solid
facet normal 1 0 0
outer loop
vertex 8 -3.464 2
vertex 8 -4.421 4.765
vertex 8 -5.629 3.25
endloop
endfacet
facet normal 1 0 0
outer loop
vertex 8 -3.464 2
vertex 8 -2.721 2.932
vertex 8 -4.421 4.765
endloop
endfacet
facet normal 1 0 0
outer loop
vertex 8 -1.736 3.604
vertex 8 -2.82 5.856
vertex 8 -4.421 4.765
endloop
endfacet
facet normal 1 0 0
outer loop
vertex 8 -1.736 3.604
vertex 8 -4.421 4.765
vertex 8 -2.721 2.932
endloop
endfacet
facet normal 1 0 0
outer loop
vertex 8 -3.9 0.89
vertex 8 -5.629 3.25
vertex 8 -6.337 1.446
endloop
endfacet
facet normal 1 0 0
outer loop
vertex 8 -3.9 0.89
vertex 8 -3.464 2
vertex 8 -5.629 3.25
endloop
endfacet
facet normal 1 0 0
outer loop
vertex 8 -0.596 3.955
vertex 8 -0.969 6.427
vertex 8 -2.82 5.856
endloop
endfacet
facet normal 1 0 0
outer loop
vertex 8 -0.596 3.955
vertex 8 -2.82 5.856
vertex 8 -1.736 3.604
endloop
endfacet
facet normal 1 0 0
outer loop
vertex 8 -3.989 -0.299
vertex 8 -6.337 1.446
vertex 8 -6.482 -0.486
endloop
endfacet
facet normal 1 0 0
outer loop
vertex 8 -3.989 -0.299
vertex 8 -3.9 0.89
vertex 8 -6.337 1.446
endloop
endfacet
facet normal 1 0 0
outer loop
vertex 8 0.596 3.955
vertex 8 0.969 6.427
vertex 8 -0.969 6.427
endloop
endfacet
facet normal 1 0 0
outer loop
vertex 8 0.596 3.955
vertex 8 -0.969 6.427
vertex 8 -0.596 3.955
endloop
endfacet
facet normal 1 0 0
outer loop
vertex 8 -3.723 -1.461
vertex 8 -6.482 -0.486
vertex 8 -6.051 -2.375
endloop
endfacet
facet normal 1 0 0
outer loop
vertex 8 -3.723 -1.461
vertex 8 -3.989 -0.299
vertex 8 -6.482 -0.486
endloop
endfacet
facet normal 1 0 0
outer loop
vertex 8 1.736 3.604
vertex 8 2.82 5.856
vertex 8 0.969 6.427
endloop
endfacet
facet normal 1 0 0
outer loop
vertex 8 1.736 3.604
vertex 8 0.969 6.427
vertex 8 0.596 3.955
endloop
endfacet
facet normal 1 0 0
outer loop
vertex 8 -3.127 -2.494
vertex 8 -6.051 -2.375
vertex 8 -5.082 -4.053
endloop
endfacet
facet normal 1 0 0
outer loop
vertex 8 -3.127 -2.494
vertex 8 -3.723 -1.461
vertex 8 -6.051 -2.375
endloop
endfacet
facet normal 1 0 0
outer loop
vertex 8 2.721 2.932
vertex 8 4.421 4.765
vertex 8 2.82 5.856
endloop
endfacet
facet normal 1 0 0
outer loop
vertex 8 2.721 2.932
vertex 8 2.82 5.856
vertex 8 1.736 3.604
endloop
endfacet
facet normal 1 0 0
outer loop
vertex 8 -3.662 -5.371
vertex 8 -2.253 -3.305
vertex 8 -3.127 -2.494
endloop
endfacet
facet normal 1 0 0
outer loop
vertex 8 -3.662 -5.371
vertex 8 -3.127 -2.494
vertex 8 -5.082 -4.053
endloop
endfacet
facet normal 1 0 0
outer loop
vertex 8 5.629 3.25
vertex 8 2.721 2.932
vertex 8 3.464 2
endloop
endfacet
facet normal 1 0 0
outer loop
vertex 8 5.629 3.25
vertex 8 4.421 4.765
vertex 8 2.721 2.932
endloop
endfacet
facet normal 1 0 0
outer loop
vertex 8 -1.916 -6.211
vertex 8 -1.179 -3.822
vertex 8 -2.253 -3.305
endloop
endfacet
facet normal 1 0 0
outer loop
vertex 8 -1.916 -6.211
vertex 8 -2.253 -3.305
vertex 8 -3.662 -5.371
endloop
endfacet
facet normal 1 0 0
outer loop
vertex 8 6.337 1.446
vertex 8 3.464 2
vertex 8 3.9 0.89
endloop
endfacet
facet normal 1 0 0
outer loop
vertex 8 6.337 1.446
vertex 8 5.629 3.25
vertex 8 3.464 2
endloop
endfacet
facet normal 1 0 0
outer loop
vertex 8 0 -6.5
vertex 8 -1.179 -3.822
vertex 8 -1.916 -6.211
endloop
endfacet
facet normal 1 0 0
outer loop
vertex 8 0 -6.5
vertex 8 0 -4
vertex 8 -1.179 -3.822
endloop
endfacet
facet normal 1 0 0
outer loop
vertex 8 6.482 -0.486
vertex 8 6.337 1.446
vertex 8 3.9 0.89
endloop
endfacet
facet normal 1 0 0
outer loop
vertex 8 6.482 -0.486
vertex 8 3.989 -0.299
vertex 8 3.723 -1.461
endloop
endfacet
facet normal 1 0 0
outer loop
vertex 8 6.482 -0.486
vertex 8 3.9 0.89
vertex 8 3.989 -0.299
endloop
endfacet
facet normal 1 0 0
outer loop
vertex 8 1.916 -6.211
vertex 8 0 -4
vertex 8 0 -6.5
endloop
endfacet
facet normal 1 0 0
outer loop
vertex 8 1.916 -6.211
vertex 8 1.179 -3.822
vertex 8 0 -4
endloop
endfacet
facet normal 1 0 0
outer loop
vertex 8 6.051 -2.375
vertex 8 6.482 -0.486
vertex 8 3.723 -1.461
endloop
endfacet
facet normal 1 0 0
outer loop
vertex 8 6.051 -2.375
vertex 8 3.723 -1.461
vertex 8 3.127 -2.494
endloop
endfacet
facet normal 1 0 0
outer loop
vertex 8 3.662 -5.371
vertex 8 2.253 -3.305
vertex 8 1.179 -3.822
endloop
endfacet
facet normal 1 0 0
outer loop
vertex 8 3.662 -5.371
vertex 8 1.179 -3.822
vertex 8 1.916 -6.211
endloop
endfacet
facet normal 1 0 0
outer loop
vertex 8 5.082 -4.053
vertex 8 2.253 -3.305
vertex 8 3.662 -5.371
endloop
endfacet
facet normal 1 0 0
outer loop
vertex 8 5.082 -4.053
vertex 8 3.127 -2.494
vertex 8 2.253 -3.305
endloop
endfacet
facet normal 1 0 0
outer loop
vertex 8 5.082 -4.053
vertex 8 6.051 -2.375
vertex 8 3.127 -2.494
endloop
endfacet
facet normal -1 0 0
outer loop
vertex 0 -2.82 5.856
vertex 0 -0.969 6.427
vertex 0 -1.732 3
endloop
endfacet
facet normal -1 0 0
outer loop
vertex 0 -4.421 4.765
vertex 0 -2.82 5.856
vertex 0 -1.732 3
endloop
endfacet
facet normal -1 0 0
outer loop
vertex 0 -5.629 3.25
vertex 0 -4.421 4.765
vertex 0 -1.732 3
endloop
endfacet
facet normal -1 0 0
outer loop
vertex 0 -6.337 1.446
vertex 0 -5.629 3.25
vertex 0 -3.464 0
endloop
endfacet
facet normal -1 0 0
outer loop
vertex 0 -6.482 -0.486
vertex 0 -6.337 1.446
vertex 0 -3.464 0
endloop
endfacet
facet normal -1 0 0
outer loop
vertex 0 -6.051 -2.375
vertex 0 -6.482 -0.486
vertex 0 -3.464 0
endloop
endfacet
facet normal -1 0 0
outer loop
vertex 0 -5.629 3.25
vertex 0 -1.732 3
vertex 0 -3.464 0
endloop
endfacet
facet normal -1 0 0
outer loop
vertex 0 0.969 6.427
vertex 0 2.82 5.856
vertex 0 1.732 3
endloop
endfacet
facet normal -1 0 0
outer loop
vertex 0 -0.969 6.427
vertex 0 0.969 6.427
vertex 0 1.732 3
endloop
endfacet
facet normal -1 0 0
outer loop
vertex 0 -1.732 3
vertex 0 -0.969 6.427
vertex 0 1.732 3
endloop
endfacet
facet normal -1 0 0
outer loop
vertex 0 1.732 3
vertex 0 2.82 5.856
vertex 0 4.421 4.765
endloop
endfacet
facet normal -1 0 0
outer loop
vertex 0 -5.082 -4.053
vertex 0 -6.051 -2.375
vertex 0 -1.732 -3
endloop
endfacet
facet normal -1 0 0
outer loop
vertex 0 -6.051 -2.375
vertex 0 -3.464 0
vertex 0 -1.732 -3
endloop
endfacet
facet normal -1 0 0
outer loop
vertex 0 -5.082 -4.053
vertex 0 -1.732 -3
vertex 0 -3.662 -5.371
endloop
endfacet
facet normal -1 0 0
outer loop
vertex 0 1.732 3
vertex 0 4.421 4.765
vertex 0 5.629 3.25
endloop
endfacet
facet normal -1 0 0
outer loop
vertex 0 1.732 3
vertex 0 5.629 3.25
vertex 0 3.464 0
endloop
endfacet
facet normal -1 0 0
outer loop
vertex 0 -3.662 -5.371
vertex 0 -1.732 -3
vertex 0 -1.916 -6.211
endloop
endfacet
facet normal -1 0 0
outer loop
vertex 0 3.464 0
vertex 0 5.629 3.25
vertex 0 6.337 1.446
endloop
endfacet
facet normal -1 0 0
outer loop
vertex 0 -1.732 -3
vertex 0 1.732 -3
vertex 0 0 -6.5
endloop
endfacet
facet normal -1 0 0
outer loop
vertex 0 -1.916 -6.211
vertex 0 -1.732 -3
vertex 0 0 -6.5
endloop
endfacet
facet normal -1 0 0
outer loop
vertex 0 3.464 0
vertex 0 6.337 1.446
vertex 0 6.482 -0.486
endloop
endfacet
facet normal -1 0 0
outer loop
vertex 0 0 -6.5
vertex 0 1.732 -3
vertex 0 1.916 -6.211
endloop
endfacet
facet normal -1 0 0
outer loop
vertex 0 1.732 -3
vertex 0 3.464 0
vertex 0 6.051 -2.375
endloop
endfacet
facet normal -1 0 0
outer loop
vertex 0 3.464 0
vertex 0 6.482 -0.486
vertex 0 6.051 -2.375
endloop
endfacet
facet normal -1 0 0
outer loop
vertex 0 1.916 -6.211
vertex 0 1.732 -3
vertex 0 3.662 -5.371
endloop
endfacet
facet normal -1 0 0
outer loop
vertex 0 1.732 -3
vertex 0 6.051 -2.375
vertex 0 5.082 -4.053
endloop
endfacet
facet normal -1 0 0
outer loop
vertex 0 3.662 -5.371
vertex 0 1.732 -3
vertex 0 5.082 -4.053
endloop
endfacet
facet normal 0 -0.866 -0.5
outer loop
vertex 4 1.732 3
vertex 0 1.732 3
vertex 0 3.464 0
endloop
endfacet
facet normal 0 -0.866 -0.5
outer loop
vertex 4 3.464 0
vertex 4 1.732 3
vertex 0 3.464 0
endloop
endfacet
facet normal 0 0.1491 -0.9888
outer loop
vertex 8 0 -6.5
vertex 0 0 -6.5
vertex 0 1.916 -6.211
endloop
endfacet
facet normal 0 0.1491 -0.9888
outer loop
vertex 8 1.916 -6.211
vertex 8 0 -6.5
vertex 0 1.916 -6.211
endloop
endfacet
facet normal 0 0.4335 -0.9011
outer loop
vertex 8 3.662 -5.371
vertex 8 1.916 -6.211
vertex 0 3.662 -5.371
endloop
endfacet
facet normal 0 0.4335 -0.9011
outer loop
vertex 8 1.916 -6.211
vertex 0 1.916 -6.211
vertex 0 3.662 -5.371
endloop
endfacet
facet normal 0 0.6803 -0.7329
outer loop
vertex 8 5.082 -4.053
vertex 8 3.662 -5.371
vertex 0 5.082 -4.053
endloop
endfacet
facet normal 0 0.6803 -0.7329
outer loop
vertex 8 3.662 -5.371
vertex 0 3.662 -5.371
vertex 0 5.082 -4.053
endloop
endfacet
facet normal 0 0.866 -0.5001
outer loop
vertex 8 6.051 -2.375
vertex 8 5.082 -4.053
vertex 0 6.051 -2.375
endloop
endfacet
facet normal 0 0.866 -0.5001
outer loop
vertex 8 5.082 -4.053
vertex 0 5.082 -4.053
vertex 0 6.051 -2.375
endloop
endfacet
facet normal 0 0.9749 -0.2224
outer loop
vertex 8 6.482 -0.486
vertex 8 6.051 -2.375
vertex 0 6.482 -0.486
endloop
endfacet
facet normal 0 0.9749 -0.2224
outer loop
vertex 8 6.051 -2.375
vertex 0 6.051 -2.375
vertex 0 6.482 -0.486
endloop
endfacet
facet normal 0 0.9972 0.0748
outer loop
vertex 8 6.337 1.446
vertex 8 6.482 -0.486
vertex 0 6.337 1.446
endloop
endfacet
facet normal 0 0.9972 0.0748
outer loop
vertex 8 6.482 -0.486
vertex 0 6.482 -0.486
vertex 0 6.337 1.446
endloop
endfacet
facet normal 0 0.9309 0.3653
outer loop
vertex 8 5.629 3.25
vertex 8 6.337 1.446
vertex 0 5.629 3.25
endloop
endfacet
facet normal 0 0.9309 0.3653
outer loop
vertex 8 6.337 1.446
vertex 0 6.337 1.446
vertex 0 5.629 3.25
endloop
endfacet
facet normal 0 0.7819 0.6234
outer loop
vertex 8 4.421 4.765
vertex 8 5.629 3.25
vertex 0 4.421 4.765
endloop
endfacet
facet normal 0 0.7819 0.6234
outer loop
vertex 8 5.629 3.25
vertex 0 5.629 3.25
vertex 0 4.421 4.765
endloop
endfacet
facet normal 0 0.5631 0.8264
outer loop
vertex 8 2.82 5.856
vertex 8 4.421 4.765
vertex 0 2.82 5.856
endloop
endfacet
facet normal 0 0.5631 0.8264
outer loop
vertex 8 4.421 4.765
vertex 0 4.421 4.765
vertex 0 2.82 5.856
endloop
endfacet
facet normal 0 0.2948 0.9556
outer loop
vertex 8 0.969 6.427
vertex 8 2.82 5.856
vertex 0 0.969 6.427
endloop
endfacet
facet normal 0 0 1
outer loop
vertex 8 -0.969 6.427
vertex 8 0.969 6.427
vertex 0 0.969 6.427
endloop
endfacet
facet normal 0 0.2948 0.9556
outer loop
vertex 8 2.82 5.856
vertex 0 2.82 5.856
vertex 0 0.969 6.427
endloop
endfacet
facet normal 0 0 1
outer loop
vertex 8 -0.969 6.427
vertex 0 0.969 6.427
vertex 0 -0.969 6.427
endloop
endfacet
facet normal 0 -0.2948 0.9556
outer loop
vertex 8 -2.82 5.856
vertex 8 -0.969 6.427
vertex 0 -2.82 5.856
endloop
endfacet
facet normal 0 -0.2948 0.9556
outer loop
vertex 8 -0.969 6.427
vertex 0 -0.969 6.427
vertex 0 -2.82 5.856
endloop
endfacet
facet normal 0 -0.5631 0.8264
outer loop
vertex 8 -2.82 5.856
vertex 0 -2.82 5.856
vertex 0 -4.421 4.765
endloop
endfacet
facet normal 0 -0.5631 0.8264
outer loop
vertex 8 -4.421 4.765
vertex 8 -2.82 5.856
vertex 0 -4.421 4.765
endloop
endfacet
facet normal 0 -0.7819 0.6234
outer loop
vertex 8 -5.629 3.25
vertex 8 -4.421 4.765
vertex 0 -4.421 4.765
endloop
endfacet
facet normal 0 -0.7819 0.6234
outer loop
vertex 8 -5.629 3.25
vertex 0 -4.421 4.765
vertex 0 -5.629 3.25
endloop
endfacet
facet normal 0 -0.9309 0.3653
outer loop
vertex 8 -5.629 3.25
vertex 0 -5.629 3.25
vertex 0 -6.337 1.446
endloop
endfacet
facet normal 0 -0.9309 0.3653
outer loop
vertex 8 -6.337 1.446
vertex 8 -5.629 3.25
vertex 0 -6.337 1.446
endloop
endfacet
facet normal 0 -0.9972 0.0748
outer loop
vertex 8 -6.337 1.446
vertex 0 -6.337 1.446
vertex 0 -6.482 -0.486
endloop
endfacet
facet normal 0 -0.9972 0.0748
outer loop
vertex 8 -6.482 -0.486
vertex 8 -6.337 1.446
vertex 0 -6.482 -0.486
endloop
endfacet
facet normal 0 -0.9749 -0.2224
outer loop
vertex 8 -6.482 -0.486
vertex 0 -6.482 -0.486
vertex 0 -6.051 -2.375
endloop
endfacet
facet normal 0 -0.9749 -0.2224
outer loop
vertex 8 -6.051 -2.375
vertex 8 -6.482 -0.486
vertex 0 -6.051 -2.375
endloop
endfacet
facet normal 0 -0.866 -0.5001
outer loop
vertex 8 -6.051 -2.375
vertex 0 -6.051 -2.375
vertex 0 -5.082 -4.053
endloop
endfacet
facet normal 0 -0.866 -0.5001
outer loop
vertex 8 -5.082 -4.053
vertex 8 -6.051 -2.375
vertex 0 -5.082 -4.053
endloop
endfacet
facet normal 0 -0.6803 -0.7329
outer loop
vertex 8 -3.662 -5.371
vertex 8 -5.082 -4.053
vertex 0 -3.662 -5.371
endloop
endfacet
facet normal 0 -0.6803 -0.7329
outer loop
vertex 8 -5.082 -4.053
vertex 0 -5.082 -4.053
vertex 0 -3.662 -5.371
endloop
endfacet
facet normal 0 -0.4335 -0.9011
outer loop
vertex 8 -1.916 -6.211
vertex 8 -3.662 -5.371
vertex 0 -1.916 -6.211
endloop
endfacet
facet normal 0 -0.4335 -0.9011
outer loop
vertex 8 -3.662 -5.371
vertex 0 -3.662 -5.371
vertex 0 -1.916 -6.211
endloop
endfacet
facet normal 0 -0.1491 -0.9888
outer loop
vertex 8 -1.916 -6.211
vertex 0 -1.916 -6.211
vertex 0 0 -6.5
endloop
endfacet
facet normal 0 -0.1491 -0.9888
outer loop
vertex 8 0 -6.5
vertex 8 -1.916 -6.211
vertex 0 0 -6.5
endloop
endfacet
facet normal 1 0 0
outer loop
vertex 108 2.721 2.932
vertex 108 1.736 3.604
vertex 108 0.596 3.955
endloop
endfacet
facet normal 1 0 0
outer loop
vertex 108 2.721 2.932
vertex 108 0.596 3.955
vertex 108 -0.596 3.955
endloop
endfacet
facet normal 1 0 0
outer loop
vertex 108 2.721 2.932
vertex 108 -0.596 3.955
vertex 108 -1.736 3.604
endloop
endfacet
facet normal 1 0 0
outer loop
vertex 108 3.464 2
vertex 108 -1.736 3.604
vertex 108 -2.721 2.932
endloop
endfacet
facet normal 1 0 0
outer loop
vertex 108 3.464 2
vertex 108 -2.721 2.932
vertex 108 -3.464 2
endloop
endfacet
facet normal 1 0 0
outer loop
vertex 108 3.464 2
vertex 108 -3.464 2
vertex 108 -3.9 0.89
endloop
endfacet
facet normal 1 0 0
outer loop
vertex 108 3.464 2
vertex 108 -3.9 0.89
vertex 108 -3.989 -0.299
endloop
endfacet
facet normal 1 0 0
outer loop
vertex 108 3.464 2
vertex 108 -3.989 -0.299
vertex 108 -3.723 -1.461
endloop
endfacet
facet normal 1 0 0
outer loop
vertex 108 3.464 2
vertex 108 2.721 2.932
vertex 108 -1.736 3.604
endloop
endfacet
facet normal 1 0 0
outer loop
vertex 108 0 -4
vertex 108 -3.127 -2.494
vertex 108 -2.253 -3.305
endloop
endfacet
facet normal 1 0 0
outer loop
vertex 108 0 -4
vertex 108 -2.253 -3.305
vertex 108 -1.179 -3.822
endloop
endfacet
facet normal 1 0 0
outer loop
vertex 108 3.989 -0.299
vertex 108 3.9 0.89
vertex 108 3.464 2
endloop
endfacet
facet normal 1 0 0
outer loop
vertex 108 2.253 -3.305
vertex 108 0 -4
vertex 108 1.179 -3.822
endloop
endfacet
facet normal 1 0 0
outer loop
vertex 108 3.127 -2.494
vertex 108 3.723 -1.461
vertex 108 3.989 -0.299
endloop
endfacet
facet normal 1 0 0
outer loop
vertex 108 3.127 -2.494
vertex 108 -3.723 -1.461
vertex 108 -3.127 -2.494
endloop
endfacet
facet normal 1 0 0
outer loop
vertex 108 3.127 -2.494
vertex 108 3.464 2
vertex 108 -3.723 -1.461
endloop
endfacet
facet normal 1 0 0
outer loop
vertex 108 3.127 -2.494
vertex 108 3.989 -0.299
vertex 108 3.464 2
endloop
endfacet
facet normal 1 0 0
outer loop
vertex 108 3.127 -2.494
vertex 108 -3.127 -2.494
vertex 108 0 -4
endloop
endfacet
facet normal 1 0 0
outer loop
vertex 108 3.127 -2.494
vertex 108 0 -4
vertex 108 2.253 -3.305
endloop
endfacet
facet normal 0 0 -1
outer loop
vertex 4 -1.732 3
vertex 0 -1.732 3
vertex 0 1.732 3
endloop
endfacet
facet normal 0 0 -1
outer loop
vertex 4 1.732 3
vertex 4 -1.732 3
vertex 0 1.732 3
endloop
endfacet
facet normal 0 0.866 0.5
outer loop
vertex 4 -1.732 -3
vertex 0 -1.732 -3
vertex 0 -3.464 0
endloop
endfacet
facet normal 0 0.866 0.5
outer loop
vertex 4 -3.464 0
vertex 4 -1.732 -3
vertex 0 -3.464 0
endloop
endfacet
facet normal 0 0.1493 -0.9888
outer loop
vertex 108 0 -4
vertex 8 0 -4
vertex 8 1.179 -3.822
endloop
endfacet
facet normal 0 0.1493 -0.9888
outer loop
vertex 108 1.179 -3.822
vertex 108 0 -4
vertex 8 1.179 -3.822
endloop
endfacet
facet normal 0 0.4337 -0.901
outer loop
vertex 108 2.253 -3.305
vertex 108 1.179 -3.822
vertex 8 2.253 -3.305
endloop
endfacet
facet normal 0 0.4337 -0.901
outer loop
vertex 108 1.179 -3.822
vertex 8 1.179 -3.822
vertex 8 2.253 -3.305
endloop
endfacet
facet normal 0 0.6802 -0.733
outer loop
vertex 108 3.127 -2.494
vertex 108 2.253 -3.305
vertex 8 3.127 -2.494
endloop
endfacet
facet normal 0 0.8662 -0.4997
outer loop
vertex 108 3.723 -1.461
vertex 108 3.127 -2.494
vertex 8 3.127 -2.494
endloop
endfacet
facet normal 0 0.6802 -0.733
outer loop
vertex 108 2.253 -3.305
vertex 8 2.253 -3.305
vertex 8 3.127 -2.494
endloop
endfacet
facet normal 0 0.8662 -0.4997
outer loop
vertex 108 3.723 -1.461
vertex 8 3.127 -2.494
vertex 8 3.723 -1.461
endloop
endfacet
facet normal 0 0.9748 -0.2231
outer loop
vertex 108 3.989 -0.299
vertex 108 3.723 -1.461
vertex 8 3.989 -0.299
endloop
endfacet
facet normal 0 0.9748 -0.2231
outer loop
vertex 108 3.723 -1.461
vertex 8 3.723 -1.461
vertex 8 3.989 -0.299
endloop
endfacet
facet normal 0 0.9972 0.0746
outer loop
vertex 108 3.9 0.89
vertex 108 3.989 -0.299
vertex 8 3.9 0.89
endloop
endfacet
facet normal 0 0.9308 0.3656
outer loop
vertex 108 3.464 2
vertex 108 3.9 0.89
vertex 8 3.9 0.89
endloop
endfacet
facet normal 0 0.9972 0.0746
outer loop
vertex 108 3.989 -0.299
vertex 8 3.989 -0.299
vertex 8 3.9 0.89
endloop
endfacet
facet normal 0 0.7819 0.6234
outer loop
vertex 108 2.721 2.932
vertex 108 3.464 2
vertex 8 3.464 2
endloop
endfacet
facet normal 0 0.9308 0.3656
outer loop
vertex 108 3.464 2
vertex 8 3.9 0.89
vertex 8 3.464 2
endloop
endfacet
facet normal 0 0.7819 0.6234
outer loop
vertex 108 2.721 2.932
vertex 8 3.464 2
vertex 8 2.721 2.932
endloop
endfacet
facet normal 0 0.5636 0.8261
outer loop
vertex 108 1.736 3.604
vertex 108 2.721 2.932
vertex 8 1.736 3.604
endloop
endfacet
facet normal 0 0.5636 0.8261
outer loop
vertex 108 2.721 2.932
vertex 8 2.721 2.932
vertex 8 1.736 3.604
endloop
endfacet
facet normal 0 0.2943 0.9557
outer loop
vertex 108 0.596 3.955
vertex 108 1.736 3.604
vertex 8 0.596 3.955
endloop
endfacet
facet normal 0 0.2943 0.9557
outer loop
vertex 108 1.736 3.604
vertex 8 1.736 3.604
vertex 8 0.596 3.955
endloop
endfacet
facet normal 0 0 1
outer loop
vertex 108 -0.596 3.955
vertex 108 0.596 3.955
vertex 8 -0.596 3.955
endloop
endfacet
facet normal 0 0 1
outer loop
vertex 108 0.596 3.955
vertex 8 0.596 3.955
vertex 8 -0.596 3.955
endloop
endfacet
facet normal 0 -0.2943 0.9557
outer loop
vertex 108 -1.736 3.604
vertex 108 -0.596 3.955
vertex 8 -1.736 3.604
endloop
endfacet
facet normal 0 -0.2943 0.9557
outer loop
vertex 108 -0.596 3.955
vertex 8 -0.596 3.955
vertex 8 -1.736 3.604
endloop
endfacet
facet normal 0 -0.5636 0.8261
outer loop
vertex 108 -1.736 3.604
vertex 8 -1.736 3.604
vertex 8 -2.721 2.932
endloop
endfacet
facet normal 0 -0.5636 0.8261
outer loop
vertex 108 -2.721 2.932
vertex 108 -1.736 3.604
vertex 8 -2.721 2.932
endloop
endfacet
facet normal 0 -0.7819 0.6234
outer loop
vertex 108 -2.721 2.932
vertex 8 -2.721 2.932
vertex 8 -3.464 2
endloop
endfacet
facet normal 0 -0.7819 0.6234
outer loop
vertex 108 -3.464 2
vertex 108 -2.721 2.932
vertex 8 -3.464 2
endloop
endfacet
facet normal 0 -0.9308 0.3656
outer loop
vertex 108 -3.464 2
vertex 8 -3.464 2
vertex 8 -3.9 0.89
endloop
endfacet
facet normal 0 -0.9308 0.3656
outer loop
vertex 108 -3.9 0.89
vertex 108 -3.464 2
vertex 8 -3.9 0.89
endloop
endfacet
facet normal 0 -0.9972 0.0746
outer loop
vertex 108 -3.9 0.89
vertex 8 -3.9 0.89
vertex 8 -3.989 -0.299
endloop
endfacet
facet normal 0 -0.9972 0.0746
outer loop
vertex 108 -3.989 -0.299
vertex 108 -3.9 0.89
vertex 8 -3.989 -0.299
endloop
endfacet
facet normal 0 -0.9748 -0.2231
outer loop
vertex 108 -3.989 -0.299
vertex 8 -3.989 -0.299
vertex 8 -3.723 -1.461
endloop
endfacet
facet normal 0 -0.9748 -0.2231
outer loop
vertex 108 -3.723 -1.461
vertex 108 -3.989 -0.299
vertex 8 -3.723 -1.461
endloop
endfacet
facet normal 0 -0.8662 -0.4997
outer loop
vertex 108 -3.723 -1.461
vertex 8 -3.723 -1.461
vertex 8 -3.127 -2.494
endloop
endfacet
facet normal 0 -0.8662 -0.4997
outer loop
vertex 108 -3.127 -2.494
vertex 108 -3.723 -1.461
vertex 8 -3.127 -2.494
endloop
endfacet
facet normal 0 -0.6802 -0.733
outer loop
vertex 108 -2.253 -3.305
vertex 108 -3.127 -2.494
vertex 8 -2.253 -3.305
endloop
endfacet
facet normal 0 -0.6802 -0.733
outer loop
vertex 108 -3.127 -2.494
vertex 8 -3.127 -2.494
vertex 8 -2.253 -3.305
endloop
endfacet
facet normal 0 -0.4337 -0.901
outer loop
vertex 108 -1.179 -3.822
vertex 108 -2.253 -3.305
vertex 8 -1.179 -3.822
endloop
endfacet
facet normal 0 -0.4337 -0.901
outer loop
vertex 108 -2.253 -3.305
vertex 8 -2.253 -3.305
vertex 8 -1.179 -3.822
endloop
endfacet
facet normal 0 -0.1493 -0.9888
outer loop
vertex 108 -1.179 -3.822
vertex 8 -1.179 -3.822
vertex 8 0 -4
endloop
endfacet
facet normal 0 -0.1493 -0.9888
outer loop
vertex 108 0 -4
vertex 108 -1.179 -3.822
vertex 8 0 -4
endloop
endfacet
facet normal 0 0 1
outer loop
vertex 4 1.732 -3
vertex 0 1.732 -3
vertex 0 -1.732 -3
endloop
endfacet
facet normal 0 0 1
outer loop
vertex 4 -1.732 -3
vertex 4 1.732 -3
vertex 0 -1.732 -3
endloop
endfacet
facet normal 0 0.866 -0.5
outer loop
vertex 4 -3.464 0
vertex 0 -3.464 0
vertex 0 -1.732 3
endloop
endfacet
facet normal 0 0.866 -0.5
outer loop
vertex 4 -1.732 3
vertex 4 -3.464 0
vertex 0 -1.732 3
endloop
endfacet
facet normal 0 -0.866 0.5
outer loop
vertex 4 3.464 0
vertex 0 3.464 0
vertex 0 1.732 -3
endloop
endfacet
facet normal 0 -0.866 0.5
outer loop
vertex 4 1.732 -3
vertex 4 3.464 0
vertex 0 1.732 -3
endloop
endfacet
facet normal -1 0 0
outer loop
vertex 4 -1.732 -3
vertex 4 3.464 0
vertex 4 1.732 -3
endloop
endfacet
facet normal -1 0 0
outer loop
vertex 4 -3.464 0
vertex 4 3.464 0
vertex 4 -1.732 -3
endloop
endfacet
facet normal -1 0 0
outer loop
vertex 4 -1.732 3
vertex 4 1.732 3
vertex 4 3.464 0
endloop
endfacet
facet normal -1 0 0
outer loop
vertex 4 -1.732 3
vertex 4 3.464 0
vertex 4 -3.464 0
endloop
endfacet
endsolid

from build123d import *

# Parameters (mm, degrees)
SKETCH1_R           = 6.5
BOSS_EXTRUDE1_DEPTH = 8
CUT_EXTRUDE1_DEPTH  = 4
SKETCH3_R           = 4
BOSS_EXTRUDE2_DEPTH = 100


with BuildPart() as part:
    # Sketch1 → Boss-Extrude1 (new body)
    with BuildSketch(Plane.YZ):
        with Locations(Location((0, 0, 0), (0, 0, 270))):
            Circle(SKETCH1_R)
    extrude(amount=BOSS_EXTRUDE1_DEPTH)

    # Sketch2 → Cut-Extrude1 (cut)
    with BuildSketch(Plane(origin=(0, 0, 0), x_dir=(0, -1, 0), z_dir=(-1, 0, 0))):
        Polygon((3.464101615, 0), (1.732050808, 3), (-1.732050808, 3), (-3.464101615, 0), (-1.732050808, -3), (1.732050808, -3), align=None)
    extrude(amount=-CUT_EXTRUDE1_DEPTH, mode=Mode.SUBTRACT)

    # Sketch3 → Boss-Extrude2 (add)
    with BuildSketch(Plane.YZ.offset(8)):
        with Locations(Location((0, 0, 0), (0, 0, 270))):
            Circle(SKETCH3_R)
    extrude(amount=BOSS_EXTRUDE2_DEPTH)


solid = part.part
